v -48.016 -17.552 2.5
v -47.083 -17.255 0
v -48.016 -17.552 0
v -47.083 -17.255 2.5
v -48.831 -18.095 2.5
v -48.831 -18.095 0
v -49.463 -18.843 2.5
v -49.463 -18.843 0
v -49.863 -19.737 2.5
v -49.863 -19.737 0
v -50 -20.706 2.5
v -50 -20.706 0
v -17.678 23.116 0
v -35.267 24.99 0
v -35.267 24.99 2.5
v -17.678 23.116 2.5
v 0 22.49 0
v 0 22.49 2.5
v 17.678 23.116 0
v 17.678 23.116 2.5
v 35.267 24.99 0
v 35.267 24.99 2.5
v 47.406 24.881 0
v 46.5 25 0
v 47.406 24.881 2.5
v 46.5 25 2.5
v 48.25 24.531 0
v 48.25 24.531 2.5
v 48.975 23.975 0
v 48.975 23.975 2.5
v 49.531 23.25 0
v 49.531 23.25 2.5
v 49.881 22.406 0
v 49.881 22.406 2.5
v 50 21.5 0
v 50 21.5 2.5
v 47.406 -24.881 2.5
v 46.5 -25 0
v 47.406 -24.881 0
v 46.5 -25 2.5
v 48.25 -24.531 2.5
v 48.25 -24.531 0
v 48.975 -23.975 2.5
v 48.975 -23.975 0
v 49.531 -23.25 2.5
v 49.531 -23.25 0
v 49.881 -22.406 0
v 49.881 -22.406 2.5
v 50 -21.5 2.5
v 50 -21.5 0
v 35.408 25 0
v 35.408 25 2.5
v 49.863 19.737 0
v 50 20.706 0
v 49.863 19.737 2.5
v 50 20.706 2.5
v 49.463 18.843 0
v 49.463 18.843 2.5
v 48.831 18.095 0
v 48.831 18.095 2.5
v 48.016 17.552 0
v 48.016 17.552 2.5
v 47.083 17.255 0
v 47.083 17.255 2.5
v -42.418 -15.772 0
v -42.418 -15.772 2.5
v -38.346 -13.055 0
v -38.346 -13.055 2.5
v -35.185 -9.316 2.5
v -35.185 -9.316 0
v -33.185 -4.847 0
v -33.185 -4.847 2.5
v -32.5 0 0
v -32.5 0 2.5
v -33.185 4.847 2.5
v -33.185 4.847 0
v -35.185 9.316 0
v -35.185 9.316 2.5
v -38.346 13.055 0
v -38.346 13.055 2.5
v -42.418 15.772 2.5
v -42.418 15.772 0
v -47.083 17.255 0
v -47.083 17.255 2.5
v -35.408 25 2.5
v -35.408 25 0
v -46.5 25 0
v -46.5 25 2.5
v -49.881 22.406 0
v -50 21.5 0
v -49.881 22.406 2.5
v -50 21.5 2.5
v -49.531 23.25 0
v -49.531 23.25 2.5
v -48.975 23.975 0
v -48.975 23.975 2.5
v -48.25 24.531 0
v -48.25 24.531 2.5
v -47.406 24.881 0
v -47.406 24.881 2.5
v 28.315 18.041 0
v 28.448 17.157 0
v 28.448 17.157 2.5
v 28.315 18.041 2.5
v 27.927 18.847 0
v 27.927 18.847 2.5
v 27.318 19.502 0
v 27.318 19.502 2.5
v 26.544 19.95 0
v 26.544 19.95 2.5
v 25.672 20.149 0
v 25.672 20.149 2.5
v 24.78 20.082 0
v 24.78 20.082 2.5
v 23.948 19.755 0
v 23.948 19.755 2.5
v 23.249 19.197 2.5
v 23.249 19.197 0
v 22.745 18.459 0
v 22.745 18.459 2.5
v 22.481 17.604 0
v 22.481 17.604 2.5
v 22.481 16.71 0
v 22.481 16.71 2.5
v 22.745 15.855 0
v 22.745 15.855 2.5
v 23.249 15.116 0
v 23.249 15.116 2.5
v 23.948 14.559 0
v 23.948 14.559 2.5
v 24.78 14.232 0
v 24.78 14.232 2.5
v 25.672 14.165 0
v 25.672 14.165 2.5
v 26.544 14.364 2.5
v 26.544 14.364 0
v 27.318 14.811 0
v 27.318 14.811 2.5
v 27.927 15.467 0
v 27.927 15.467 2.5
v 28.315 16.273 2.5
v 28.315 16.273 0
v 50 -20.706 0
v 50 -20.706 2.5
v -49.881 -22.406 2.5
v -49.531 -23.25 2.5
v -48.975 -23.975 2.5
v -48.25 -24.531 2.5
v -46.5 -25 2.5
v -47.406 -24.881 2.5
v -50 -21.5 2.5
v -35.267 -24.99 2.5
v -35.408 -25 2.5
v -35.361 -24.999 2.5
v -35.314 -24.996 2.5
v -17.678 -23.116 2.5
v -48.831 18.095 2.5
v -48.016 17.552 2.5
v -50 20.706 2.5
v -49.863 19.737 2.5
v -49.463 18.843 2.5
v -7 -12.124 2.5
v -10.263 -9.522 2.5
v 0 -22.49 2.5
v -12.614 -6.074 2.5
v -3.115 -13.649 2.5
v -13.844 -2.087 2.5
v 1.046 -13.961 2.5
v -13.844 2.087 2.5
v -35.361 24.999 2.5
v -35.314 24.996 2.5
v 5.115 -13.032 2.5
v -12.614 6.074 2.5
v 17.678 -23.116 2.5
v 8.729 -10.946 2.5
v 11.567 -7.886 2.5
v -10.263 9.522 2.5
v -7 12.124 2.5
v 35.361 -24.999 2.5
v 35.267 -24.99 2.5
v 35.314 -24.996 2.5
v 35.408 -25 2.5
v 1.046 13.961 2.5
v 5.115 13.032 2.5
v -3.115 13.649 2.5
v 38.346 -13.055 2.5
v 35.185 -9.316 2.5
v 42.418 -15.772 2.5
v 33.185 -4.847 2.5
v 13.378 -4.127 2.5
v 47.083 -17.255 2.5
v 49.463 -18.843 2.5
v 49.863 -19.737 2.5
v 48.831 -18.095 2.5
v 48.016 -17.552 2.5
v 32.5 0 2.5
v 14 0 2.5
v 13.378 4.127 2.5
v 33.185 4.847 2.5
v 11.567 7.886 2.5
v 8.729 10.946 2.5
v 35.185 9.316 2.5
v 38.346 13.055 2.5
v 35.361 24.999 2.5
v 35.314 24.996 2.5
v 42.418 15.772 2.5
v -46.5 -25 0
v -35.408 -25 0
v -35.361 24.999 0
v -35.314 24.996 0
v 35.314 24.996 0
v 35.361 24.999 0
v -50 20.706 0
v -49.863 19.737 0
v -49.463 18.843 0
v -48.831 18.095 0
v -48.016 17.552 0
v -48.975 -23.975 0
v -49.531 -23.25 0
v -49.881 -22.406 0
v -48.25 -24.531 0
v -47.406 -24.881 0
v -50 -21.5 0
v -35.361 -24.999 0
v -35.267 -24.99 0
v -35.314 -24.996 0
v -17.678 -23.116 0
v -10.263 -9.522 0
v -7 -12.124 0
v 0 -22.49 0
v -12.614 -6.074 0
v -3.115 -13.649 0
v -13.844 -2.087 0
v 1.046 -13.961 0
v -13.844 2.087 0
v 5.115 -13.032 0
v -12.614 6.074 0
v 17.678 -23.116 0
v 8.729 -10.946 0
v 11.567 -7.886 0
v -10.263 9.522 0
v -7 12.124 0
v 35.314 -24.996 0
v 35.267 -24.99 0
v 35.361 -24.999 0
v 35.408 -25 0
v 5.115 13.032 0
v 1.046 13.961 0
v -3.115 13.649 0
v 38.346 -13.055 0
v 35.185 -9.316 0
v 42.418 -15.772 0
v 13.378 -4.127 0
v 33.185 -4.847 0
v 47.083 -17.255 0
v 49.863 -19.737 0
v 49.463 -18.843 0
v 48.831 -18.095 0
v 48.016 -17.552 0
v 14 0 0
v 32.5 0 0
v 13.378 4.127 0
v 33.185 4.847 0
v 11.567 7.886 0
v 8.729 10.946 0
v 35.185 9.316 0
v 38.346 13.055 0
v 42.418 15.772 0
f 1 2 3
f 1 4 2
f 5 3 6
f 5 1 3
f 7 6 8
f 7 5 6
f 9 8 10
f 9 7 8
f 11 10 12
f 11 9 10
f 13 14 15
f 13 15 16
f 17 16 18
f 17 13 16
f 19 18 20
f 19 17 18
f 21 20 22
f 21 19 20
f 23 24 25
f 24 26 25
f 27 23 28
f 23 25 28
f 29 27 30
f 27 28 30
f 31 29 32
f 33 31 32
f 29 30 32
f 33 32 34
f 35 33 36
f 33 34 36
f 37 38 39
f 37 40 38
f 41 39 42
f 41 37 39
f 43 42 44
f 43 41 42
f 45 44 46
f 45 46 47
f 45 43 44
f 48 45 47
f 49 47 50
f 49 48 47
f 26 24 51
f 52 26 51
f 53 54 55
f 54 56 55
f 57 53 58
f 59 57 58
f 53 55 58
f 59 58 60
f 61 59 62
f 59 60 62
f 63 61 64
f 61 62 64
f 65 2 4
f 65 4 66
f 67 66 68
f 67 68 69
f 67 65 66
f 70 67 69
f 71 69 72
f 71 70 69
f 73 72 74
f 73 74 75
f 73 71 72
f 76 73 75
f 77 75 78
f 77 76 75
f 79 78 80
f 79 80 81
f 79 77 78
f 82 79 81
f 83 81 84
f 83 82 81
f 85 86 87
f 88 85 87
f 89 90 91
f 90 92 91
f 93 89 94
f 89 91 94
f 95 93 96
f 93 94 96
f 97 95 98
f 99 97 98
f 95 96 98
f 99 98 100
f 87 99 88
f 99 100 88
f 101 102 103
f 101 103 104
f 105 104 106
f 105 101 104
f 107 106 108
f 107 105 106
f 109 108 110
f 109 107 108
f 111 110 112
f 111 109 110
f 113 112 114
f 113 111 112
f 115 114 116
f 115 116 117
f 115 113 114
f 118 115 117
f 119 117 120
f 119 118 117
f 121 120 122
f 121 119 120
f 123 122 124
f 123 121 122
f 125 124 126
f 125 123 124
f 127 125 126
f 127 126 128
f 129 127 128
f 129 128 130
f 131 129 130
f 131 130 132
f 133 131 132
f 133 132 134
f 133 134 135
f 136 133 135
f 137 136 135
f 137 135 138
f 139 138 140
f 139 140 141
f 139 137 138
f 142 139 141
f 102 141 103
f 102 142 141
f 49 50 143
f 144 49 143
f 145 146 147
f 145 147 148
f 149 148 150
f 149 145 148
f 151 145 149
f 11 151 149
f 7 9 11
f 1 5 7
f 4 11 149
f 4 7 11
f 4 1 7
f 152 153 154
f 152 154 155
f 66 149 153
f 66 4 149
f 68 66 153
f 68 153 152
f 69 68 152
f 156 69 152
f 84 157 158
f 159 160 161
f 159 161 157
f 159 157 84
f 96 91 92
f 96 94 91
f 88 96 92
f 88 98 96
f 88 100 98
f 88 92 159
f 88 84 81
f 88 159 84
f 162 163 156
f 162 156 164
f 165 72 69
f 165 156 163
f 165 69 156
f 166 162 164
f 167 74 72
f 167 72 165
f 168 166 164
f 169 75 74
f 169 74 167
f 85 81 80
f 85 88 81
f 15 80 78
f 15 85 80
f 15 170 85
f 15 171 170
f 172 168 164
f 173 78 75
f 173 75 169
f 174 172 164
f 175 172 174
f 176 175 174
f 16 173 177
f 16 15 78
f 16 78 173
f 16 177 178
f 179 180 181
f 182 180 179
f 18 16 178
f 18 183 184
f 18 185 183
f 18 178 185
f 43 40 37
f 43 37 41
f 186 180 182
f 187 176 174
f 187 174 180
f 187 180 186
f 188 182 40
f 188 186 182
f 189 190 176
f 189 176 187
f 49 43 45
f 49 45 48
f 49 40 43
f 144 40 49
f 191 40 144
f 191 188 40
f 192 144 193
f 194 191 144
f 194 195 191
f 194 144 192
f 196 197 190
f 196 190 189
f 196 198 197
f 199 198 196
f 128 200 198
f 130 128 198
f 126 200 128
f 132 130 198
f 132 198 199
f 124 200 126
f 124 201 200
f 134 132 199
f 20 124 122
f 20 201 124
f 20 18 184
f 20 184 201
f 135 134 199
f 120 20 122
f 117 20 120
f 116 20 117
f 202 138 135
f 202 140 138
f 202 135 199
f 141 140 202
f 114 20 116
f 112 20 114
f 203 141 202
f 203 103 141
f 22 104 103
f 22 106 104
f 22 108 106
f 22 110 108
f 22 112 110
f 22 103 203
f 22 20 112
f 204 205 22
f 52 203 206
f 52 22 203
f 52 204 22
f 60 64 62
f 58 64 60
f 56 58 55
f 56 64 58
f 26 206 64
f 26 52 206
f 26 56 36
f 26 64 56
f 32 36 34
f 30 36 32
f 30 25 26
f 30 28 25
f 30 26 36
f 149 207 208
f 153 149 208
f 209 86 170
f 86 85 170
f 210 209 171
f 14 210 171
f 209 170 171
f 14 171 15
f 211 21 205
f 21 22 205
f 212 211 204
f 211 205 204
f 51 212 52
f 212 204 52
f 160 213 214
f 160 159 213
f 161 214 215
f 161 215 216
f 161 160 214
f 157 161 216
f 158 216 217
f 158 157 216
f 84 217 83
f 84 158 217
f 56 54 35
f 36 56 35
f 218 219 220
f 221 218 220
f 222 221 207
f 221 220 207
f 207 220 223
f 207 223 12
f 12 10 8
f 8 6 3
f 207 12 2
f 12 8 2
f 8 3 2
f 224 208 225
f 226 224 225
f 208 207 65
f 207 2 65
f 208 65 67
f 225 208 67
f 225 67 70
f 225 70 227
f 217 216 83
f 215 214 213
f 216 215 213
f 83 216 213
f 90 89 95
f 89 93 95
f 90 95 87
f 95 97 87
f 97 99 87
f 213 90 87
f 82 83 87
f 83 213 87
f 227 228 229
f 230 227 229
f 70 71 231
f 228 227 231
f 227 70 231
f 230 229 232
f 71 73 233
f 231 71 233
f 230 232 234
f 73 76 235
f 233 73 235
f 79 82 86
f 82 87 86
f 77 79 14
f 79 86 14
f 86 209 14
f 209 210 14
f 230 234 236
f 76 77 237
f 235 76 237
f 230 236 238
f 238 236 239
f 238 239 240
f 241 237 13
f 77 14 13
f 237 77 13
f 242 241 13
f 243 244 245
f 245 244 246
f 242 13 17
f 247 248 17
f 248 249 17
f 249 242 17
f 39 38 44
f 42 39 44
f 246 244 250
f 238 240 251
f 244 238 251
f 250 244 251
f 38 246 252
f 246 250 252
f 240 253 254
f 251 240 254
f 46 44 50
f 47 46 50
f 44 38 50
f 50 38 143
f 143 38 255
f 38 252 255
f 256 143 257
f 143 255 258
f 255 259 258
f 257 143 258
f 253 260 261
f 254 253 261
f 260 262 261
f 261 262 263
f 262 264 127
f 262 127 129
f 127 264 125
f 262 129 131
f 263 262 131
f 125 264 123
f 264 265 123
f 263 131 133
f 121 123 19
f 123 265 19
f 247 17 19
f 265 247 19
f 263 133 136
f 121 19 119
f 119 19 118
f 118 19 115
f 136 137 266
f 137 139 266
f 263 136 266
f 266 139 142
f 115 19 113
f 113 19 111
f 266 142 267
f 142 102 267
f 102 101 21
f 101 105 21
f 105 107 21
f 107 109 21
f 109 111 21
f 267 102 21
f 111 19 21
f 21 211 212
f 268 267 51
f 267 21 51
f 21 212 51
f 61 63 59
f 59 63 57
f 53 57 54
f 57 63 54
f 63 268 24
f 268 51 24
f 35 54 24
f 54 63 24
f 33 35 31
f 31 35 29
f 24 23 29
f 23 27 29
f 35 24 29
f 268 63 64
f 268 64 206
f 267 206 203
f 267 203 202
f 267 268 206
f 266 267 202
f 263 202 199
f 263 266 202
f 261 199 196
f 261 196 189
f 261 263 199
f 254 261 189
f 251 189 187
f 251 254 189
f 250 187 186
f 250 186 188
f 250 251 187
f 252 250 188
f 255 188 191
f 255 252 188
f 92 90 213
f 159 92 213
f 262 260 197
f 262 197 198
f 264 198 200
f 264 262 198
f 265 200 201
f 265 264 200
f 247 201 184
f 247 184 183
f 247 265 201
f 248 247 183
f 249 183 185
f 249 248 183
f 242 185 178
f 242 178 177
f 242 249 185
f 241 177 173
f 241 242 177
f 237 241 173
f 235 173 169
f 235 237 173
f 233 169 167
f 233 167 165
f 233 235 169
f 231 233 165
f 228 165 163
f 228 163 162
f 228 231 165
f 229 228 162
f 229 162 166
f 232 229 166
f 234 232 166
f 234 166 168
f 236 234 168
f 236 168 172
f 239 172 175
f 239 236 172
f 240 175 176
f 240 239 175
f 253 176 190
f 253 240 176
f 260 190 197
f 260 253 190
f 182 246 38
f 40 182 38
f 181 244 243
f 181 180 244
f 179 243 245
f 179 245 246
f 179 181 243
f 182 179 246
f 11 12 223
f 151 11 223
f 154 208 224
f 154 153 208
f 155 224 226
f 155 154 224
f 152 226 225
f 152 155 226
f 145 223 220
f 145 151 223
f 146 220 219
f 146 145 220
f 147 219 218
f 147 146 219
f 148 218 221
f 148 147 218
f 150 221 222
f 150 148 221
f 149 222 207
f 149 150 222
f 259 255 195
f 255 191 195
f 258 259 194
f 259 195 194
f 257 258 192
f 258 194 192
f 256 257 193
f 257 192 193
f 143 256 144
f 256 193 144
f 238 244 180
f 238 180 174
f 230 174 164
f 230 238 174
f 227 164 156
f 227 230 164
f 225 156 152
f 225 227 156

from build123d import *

# Parameters (mm, degrees)
SKETCH_R    = 14
SKETCH_R_2  = 3
PAD_DEPTH   = 2.5
FILLET_R    = 3.5
FILLET001_R = 1


with BuildPart() as part:
    # Sketch → Pad (new body)
    with BuildSketch(Plane.XY):
        with BuildLine():
            Line((-50, 25), (-50, 17.5))
            ThreePointArc((-50, -17.5), (-32.5, 0), (-50, 17.5))
            Line((-50, -17.5), (-50, -25))
            Line((-50, -25), (-35.336948, -25))
            ThreePointArc((35.336948, -25), (0, -22.49), (-35.336948, -25))
            Line((35.336948, -25), (50, -25))
            Line((50, -25), (50, -17.5))
            ThreePointArc((50, 17.5), (32.5, 0), (50, -17.5))
            Line((50, 17.5), (50, 25))
            Line((50, 25), (35.336948, 25))
            ThreePointArc((-35.336948, 25), (0, 22.49), (35.336948, 25))
            Line((-35.336948, 25), (-50, 25))
        make_face()
        Circle(SKETCH_R, mode=Mode.SUBTRACT)
        with Locations((25.44788, 17.156958)):
            Circle(SKETCH_R_2, mode=Mode.SUBTRACT)
    extrude(amount=PAD_DEPTH)

    # Fillet
    fillet_edges = [part.edges().sort_by_distance(p)[0] for p in [
        (-50, -25, 1.25),
        (50, -25, 1.25),
        (50, -17.5, 1.25),
        (50, 25, 1.25),
        (50, 17.5, 1.25),
        (-50, 17.5, 1.25),
        (-50, 25, 1.25),
        (-50, -17.5, 1.25),
    ]]
    fillet(fillet_edges, radius=FILLET_R)

    # Fillet001
    fillet001_edges = [part.edges().sort_by_distance(p)[0] for p in [
        (35.336948, 25, 1.25),
        (-35.336948, 25, 1.25),
        (-35.336948, -25, 1.25),
        (35.336948, -25, 1.25),
    ]]
    fillet(fillet001_edges, radius=FILLET001_R)


solid = part.part
